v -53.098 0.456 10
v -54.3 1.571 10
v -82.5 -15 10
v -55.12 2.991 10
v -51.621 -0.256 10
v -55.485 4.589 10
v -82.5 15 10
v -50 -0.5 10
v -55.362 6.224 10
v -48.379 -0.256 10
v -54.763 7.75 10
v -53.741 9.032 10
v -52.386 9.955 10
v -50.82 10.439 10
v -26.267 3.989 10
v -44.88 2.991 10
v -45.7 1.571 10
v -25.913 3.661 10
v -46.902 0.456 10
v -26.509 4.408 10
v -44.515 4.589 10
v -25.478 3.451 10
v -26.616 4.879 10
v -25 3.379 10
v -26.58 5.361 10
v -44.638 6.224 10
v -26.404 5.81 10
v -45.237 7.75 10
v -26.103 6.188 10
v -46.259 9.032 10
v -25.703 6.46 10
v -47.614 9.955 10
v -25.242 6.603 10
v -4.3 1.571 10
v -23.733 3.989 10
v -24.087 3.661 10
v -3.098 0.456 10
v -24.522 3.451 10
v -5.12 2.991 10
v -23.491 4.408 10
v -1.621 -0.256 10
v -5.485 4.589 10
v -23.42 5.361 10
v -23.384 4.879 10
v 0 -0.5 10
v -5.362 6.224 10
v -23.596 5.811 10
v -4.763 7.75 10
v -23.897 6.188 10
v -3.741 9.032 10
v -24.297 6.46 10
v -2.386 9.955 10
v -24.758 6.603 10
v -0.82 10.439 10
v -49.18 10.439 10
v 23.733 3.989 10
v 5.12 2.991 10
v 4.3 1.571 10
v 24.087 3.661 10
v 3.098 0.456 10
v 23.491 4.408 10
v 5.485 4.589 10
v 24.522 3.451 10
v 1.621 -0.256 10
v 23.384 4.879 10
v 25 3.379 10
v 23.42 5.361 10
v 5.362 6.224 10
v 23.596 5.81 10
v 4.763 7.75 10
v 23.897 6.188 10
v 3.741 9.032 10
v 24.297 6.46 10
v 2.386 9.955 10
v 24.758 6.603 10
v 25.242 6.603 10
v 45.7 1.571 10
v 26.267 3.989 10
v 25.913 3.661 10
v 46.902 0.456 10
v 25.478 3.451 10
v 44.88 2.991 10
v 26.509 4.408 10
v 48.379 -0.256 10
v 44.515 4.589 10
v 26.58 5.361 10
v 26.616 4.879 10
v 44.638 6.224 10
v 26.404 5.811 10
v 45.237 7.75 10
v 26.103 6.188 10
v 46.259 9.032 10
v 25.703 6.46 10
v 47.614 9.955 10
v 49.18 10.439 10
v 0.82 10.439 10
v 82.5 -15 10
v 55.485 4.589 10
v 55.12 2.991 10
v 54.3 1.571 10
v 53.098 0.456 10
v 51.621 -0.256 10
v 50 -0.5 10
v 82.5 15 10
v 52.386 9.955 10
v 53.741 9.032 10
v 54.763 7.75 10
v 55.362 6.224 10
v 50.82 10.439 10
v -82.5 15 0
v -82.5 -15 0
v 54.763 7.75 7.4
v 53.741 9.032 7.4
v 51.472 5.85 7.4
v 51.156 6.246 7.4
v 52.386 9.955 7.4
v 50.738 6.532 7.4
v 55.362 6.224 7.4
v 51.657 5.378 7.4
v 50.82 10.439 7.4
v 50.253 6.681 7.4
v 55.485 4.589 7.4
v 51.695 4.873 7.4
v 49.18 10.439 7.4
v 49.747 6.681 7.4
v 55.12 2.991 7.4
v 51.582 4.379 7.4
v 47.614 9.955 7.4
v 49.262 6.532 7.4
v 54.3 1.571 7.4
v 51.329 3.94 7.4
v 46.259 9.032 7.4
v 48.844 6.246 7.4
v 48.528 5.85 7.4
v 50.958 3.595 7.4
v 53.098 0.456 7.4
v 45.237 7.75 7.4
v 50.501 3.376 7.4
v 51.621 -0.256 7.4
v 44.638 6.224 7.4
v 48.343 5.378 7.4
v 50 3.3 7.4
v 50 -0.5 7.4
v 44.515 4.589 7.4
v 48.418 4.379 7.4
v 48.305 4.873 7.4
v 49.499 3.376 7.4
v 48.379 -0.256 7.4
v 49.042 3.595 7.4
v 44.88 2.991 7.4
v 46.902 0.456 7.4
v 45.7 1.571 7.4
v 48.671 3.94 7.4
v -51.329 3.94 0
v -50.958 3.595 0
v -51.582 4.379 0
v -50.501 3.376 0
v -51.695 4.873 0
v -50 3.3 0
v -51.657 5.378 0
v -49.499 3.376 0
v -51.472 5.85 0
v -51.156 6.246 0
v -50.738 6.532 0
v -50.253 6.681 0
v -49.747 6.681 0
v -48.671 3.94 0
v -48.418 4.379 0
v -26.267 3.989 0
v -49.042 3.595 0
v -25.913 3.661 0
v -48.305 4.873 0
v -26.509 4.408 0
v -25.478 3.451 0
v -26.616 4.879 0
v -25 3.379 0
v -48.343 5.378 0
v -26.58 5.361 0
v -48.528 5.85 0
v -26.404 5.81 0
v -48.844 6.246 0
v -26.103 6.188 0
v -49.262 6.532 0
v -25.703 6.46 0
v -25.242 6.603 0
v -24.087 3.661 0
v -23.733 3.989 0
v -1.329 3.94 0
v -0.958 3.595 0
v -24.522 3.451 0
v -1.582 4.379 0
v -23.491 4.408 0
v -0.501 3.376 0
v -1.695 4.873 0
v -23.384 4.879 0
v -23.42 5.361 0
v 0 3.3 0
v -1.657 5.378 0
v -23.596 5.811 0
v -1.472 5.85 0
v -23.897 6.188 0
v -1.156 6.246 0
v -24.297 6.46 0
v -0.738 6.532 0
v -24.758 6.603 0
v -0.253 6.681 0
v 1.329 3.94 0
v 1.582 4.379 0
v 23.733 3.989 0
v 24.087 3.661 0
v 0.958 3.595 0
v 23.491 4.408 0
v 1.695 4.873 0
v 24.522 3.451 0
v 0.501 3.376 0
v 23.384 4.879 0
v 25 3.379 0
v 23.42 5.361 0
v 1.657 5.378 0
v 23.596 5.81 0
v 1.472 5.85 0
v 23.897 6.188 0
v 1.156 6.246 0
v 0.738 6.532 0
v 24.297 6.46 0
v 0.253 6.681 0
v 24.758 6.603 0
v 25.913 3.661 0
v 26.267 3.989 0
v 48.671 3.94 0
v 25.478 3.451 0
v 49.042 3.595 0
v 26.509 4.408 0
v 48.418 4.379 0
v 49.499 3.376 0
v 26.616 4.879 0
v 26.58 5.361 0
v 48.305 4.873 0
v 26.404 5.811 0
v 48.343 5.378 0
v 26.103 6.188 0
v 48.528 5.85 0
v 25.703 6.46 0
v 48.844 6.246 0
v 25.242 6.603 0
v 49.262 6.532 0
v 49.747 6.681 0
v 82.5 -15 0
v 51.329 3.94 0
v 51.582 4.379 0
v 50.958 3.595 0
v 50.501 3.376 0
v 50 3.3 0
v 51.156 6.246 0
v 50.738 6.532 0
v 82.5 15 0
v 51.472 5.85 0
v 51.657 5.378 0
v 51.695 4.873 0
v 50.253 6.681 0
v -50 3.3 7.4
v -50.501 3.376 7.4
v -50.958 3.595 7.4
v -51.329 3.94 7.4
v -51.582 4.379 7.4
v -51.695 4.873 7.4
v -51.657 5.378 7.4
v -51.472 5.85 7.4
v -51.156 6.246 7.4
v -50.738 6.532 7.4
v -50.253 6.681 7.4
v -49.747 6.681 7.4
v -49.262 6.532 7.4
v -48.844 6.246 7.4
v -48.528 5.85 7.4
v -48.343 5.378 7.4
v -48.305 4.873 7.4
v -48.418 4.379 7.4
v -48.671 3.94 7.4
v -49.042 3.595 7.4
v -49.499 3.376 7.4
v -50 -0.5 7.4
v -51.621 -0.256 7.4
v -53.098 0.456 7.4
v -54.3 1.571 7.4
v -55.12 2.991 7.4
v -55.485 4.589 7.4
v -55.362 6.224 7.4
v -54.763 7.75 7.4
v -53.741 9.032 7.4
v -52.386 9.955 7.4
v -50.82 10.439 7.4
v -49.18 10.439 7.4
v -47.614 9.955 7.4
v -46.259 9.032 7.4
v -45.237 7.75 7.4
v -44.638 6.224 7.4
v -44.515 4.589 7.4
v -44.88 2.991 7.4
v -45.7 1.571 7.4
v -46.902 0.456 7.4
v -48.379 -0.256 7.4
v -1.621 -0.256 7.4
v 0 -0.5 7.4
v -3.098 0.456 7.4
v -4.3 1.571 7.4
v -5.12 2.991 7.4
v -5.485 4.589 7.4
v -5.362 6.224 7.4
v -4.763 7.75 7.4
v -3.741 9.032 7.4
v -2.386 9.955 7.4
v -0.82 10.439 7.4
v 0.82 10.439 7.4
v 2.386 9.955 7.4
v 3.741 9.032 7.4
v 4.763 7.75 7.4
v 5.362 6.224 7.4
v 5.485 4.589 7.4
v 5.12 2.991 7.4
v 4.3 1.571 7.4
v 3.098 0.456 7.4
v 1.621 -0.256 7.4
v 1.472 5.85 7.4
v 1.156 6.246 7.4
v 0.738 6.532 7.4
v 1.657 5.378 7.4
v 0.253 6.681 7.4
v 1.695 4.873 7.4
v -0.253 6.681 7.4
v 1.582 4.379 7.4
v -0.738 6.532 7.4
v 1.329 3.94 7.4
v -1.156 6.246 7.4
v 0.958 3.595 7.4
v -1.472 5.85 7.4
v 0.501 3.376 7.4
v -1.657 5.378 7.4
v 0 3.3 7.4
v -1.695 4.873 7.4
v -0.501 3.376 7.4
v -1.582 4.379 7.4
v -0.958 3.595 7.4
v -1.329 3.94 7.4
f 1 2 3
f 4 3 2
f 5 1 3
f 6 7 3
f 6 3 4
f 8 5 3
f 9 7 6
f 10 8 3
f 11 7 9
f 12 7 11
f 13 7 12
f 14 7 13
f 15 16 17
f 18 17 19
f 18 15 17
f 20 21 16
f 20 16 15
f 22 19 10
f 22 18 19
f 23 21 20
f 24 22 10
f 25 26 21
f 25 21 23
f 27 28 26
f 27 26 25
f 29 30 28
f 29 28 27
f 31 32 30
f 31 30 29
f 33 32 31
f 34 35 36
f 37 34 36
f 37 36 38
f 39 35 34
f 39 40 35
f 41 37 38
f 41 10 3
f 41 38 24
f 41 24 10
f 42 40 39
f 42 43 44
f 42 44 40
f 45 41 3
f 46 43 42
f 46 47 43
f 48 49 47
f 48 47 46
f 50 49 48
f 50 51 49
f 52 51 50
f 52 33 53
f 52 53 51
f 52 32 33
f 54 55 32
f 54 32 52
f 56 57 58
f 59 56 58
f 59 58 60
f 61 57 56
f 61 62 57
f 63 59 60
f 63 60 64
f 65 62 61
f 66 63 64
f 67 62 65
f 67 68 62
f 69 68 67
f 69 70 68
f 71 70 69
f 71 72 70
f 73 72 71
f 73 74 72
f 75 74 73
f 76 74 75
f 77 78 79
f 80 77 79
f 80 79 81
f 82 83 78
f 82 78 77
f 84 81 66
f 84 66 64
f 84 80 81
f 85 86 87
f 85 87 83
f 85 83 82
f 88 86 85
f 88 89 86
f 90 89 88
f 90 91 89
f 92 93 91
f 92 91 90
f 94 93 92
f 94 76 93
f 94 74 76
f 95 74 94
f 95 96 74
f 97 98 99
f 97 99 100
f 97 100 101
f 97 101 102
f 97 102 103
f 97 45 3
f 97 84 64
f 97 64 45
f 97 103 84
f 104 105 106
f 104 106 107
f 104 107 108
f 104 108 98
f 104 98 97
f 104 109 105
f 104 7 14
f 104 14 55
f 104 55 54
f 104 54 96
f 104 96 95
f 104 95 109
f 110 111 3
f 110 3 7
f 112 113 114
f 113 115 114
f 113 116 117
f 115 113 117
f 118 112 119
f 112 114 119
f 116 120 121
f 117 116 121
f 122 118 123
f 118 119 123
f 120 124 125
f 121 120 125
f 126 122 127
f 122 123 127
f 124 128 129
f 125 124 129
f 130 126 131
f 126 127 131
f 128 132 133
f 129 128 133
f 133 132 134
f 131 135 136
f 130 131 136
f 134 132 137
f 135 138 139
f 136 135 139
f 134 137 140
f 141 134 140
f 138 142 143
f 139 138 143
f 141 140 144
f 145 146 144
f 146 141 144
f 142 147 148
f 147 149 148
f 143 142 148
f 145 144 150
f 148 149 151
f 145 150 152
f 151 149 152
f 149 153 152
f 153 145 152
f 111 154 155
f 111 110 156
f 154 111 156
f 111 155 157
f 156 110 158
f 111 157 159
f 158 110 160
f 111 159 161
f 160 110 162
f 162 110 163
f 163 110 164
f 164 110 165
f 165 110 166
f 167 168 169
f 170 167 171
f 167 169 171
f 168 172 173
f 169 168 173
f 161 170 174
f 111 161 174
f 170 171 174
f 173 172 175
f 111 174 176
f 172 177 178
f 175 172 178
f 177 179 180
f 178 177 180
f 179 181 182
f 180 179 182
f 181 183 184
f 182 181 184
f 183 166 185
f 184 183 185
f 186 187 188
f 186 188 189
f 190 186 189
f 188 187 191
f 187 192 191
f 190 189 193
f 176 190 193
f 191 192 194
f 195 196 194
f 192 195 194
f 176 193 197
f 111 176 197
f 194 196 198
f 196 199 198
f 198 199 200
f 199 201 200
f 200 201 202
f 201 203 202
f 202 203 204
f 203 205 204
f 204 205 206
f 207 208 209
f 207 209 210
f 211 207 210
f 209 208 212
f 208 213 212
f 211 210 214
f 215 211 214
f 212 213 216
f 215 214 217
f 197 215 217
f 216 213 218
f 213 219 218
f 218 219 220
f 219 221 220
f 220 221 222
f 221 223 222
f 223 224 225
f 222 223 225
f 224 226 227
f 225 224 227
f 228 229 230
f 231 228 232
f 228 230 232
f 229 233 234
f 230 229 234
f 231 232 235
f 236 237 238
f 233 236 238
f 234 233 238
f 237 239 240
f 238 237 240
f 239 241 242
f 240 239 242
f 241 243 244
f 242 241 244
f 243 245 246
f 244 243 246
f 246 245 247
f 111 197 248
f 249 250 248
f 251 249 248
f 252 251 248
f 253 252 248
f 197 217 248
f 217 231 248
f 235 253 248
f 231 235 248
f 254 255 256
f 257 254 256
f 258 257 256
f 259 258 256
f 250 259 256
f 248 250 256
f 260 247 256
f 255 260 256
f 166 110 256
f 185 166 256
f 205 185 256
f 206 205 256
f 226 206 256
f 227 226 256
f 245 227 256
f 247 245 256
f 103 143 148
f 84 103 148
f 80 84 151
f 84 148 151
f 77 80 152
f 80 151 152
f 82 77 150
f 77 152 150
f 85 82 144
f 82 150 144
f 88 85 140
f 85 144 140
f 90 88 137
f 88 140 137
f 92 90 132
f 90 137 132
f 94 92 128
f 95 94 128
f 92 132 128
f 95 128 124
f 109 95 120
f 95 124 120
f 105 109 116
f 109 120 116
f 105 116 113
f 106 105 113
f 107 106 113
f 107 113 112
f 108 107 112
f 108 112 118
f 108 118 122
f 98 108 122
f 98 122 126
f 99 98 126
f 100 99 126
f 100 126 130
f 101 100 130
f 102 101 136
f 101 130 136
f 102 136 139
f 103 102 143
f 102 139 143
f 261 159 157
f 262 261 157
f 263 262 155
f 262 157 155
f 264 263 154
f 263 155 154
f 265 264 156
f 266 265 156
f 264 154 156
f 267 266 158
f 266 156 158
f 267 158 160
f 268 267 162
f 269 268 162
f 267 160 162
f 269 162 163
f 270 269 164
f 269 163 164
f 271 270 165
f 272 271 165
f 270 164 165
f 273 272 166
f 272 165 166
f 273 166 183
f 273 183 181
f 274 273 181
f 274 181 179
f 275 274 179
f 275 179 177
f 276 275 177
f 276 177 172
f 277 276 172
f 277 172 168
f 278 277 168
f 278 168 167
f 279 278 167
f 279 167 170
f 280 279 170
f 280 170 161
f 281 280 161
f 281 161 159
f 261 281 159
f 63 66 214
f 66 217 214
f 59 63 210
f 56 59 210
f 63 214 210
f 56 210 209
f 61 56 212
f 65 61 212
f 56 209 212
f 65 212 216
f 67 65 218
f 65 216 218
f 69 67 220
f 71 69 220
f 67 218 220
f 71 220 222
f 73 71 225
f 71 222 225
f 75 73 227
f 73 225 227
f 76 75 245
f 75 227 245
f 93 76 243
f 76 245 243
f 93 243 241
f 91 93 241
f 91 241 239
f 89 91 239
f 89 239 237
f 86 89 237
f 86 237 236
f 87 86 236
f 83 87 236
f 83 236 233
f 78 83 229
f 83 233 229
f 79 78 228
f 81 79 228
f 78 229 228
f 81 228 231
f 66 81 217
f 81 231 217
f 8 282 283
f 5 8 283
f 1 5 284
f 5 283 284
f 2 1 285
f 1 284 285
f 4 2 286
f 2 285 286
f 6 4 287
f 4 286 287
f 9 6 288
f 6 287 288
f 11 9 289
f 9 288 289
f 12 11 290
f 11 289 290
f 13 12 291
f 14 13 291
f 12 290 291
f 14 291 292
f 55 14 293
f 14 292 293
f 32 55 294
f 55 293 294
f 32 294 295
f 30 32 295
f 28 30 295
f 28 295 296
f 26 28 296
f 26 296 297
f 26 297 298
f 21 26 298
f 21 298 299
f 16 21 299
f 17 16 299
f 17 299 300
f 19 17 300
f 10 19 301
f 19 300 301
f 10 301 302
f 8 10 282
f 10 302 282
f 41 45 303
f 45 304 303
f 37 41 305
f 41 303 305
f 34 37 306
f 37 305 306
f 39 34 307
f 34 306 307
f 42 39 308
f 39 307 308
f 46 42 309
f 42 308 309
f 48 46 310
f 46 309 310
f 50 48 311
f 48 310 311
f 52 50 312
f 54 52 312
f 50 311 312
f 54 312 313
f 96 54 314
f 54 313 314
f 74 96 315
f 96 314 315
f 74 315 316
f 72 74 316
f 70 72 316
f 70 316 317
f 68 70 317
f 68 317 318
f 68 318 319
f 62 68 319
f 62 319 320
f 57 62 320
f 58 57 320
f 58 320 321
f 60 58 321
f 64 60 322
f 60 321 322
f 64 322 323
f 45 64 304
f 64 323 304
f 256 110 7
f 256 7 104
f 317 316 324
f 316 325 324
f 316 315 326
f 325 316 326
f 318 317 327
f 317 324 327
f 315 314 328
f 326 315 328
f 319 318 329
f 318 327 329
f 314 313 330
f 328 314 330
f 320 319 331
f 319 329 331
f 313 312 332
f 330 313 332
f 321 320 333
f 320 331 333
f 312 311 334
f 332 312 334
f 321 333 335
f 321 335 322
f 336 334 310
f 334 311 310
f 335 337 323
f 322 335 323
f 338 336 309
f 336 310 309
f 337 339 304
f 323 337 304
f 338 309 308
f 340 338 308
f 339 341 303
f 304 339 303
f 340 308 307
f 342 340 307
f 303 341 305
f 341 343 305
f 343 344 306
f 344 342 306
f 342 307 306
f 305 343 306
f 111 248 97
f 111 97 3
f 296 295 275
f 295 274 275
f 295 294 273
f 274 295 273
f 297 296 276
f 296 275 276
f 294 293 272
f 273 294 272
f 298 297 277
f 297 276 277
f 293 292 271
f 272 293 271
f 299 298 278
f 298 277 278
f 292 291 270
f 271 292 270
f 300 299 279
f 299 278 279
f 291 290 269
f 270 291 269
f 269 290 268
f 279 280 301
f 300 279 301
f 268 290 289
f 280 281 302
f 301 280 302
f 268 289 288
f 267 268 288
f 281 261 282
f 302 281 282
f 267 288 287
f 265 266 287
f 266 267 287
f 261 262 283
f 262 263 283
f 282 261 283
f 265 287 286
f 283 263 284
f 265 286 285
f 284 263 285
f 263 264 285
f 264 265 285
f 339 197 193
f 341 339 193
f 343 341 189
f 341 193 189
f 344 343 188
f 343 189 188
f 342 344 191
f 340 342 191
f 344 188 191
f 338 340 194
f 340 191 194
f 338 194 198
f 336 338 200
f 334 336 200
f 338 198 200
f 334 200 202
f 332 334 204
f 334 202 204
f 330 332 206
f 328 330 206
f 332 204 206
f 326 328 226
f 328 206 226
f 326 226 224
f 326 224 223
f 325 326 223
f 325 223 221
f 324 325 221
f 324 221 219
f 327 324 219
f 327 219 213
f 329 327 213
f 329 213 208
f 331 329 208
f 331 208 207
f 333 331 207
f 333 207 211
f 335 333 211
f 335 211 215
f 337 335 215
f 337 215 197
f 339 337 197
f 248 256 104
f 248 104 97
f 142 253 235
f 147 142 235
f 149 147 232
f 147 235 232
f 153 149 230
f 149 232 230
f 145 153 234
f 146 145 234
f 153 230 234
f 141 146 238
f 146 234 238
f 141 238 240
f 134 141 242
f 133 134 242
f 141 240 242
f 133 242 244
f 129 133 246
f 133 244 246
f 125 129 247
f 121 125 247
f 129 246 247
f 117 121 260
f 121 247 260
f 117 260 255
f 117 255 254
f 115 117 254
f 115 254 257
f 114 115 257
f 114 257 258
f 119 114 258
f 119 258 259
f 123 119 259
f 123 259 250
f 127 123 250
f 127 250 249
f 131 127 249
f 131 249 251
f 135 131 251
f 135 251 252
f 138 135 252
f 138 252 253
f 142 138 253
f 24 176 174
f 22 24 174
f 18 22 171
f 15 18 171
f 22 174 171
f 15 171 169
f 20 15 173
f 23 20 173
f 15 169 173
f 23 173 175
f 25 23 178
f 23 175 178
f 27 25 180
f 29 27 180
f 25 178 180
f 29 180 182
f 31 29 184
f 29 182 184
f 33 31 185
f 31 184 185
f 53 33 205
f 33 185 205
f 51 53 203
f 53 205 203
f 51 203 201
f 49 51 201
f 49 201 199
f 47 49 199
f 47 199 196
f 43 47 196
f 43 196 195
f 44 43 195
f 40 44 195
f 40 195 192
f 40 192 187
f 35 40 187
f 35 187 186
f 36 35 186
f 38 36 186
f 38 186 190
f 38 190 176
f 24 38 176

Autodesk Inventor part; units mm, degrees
ref_plane "YZ Plane" through (0, 0, 0) normal (1, 0, 0) x (0, 1, 0)
ref_plane "XZ Plane" through (0, 0, 0) normal (0, 1, 0) x (-1, 0, 0)
ref_plane "XY Plane" through (0, 0, 0) normal (0, 0, 1) x (1, 0, 0)
sketch "Sketch1" plane through (0, 0, 0) normal (0, 0, 1) x (1, 0, 0)
  line L0 (-82.5, 15) -> (82.5, 15)
  line L1 (82.5, 15) -> (82.5, -15)
  line L2 (82.5, -15) -> (-82.5, -15)
  line L3 (-82.5, -15) -> (-82.5, 15)
  point P0 (0, 0)
  dimension "d0" = 165
  dimension "d1" = 30
  dimension "d2" = 82.5
  dimension "d3" = 15
extrude "Extrusion1" add sketch "Sketch1" along normal blind 10
sketch "Sketch2" plane through (0, 0, 10) normal (0, 0, 1) x (1, 0, 0)
  line L0 (82.5, 15) -> (-82.5, 15) projected
  point P0 (0, 0)
  point P1 (-50, 5)
  point P2 (0, 5)
  point P3 (50, 5)
  dimension "d6" = 50
  dimension "d24" = 50
  dimension "d25" = 10
hole "Hole1" at (-50, 5, 10) at (0, 5, 10) at (50, 5, 10) direction (0, 0, -1) diameter 3.4 end through all counterbore diameter 11 counterbore depth 2.6 clearance for "Hex Head Cap Screw ISO 24017" size "M3" standard "ISO"
sketch "Sketch3" plane through (0, 0, 10) normal (0, 0, 1) x (1, 0, 0)
  line L0 (82.5, 15) -> (-82.5, 15) projected
  circle A0 centre (0, 5) radius 1.7 projected
  point P0 (0, 0)
  point P1 (-25, 5)
  point P2 (25, 5)
  dimension "d15" = 50
  dimension "d26" = 10
  dimension "d27" = 25
hole "Hole2" at (-25, 5, 10) at (25, 5, 10) direction (0, 0, -1) diameter 3.242 depth 11.8 tip angle 118 thread size "M4x0.7" class "6H" standard "ISO Metric profile"
equation "\"d2\" = 0.5 * d0"
equation "\"d3\" = 0.5 * d1"
equation "\"d27\" = 0.5 * d15"
properties part number "zStage_jackAttach"
